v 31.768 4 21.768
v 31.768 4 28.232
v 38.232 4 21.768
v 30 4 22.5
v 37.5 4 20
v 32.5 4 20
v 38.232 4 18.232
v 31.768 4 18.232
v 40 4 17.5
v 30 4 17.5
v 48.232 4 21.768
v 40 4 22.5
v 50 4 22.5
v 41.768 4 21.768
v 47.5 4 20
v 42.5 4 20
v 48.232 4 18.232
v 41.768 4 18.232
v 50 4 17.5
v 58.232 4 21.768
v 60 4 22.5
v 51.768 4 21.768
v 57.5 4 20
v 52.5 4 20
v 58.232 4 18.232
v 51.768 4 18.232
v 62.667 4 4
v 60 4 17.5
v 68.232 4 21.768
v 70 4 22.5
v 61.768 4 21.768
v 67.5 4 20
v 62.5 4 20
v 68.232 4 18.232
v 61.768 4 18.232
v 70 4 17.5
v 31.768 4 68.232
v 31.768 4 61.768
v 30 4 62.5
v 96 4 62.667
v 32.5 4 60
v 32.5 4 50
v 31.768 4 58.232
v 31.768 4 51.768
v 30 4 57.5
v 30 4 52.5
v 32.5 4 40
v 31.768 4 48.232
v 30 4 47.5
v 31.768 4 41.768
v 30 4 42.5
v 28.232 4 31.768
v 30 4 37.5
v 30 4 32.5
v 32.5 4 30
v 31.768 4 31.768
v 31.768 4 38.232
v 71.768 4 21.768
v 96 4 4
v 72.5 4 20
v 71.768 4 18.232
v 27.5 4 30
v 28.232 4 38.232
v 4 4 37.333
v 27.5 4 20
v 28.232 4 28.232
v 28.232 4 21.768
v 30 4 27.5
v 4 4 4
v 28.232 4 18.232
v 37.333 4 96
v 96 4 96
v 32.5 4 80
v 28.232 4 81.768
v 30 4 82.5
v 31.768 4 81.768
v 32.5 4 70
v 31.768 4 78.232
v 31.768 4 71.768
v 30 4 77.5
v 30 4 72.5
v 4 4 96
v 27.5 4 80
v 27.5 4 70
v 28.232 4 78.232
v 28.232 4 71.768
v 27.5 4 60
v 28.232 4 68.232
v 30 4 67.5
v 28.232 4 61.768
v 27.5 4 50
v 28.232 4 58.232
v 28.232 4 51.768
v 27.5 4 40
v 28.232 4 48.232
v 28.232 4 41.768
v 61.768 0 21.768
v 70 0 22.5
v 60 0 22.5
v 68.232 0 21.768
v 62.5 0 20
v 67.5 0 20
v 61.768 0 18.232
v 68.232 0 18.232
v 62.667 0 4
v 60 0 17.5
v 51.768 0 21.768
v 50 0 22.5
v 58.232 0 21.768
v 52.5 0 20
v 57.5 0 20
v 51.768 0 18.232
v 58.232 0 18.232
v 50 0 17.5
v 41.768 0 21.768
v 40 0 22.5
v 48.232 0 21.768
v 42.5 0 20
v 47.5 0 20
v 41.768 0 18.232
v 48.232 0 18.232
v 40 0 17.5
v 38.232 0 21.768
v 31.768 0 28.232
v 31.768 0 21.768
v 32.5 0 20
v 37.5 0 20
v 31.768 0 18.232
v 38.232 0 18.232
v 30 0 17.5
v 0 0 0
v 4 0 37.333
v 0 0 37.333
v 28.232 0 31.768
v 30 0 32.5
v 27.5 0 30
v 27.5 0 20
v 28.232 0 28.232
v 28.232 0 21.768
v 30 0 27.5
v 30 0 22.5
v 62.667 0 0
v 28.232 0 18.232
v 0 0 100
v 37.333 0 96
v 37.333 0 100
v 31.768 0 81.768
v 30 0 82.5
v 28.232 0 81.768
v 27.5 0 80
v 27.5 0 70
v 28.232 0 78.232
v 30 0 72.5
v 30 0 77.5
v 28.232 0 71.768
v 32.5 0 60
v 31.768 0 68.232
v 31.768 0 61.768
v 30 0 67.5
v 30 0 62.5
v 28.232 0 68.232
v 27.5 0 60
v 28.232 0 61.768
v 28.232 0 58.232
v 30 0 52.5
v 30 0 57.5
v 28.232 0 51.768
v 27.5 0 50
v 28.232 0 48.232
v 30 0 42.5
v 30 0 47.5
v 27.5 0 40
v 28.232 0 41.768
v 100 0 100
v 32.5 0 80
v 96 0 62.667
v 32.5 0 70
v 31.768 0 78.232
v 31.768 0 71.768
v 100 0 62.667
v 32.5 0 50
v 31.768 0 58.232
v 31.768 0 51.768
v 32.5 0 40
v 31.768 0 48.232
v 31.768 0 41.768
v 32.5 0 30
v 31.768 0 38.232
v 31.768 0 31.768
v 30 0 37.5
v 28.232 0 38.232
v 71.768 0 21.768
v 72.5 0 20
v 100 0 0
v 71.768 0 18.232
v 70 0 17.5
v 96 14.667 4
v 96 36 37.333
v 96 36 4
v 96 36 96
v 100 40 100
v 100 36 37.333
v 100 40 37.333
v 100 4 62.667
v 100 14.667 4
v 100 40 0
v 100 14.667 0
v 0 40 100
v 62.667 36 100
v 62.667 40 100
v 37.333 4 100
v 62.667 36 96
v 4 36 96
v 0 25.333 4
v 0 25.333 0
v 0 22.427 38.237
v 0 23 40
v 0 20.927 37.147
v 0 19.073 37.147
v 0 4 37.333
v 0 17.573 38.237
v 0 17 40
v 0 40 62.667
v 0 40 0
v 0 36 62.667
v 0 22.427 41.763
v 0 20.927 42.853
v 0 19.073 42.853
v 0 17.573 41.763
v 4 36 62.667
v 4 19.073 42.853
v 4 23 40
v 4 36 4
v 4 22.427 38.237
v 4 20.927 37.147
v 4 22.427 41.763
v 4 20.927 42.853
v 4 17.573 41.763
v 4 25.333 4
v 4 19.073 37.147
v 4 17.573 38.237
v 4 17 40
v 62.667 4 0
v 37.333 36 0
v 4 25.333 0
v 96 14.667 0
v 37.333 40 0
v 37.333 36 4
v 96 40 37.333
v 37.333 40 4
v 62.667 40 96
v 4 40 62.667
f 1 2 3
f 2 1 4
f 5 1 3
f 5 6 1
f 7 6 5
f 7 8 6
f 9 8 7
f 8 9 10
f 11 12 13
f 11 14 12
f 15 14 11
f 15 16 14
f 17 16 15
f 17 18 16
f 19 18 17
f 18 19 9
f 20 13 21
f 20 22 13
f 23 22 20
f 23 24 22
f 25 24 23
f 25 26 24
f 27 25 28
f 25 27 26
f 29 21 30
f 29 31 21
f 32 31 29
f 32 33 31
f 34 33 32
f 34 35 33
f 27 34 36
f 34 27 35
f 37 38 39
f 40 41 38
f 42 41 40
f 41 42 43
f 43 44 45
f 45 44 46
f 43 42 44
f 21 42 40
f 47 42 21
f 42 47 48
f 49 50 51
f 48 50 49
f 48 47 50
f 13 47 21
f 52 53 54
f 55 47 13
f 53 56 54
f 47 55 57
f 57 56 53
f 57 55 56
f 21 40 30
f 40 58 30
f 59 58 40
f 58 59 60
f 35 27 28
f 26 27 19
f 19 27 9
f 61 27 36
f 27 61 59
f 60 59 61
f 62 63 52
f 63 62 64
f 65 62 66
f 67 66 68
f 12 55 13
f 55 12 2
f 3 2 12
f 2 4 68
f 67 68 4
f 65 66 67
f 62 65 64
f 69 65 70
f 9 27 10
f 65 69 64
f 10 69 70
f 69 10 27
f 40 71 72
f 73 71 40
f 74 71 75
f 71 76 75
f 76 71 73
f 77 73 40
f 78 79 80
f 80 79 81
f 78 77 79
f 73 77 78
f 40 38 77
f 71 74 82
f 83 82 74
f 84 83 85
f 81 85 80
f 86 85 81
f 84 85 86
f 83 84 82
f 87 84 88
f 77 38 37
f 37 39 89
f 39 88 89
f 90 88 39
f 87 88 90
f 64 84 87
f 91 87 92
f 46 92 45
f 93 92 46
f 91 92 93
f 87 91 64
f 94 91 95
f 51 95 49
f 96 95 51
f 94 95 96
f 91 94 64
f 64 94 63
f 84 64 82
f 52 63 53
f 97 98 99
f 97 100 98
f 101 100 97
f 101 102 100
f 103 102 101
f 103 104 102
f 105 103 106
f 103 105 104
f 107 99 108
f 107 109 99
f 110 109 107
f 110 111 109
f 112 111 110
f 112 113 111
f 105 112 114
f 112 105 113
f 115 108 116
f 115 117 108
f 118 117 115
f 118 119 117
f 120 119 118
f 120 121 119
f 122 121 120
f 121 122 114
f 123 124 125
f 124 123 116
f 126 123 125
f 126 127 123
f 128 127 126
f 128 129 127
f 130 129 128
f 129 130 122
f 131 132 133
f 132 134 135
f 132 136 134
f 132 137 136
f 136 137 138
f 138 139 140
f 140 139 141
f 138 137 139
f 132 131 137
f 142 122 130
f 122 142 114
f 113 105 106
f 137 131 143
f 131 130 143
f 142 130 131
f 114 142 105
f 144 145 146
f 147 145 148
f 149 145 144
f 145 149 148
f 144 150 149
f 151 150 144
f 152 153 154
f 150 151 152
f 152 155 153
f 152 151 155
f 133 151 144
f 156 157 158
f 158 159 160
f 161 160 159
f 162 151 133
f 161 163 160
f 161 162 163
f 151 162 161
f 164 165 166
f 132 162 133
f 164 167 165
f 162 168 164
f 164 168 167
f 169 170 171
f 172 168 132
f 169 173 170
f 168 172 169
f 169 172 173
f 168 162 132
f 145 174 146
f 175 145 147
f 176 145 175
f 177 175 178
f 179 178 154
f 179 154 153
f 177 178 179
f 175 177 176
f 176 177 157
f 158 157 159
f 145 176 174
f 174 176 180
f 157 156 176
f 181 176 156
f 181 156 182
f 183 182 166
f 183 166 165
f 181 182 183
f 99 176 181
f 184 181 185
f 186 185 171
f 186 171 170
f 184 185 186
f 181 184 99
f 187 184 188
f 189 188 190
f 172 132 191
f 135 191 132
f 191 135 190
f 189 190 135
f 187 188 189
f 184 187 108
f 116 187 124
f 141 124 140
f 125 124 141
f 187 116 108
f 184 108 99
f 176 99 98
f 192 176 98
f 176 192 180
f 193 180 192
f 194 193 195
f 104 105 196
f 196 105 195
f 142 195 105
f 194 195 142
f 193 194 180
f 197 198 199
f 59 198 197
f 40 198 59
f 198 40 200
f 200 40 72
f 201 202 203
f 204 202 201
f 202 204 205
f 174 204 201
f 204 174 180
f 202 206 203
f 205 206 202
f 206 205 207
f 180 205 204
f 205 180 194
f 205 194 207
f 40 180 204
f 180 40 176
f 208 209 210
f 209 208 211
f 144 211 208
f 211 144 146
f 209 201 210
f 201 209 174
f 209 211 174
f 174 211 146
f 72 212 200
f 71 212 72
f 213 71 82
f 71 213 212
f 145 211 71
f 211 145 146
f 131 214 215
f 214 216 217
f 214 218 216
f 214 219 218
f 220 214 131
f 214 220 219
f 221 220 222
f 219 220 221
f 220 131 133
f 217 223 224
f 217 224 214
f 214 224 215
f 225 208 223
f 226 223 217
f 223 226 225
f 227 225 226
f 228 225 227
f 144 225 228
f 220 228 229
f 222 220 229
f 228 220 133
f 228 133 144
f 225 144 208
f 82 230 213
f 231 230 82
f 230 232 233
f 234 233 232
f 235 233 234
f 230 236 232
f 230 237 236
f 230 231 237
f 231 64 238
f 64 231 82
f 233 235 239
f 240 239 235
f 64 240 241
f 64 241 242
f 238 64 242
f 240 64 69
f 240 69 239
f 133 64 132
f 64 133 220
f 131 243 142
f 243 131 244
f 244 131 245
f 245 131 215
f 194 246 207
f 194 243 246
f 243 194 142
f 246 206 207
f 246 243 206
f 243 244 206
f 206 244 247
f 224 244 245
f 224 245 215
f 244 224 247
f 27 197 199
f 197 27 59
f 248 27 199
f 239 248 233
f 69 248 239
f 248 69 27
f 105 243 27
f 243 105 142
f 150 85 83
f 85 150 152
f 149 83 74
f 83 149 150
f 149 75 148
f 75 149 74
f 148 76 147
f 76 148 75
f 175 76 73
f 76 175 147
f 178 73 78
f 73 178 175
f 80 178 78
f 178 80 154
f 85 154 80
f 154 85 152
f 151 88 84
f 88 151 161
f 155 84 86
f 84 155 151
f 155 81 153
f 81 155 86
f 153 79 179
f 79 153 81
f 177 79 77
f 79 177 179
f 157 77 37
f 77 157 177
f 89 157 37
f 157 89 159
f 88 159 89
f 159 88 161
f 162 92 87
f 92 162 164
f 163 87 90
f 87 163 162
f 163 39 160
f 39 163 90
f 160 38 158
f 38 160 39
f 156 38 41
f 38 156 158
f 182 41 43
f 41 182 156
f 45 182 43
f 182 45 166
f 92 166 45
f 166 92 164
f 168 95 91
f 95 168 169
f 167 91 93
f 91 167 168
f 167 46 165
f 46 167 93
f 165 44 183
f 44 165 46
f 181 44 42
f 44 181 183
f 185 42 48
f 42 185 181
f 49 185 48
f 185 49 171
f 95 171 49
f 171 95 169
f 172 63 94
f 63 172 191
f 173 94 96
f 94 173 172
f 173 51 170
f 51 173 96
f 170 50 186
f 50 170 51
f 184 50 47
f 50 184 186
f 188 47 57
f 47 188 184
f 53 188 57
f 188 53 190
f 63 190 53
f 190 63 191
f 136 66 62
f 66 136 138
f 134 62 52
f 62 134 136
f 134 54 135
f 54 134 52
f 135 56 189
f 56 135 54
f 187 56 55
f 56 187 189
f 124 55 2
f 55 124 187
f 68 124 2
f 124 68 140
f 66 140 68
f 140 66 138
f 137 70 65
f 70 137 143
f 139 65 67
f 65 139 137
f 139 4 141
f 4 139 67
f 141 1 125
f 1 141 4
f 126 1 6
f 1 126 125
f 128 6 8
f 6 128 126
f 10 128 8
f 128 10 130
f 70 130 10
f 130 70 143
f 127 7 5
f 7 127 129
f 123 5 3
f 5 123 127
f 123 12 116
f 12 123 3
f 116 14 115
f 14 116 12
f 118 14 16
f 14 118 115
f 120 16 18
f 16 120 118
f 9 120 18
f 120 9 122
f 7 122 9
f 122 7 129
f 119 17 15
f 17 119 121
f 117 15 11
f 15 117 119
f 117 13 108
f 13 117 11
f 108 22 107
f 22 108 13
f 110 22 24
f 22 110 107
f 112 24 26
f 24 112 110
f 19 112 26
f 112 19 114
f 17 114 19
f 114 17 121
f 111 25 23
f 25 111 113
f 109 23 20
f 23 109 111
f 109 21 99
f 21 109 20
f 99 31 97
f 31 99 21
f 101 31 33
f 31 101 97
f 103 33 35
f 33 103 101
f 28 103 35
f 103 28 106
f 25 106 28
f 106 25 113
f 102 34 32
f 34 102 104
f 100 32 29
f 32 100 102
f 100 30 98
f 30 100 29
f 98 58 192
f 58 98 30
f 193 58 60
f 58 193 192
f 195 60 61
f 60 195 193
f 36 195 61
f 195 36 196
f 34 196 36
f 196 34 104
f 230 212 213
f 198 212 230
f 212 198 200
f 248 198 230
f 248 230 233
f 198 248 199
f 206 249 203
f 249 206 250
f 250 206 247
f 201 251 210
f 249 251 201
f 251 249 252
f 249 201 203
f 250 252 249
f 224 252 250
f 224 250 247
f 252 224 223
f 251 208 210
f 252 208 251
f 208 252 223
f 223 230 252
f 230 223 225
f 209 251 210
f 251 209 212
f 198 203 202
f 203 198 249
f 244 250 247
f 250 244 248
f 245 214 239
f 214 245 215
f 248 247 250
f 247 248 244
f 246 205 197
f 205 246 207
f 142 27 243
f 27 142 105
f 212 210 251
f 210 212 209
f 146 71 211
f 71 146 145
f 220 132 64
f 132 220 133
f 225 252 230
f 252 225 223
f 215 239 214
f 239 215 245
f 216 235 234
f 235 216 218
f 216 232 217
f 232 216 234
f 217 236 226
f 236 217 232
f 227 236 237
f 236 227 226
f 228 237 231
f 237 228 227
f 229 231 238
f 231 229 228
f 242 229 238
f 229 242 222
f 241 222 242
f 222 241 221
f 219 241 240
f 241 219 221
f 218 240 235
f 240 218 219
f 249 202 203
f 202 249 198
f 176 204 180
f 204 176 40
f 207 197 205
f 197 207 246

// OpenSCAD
include <./box.scad>
box(
    width = 100,
    height = 100,
    depth = 40,
    thickness = 4,
    finger_width = 20,
    assemble = true,
    labels = true,
    open = false,
    holes_left = [
        [20,40]
    ],
    hole_left_dia = 6,
    spacing = 3,
    holes_front = [
        [30,80],
        [30,70],
        [30,60],
        [30,50],
        [30,40],
        [30,30],
        [30,20],
        [40,20],
        [50,20],
        [60,20],
        [70,20]
    ],
    hole_front_dia = 5,
    only_front_holes = true
);
